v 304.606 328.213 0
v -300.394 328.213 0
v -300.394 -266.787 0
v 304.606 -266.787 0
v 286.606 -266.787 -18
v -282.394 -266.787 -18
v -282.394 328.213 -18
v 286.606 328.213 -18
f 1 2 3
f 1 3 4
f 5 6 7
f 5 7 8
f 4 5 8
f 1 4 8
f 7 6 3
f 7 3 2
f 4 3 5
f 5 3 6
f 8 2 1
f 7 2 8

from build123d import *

# Parameters (mm, degrees)
F0_W     = 605
F0_H     = 595
F1_DEPTH = 18
F2_SIZE  = 17.99999


# Not quite as in the source:
# - a fillet or chamfer is up to 0.001 mm smaller than in the source, because OpenCascade refuses the exact size


with BuildPart() as f1:
    # F0 (on Top) → F1 (new body)
    with BuildSketch(Plane.XY):
        with Locations((2.1061599255, 30.7130831559)):
            Rectangle(F0_W, F0_H)
    extrude(amount=-F1_DEPTH)

    # F2 (size 18 in the source; OpenCascade refuses exactly that, so slightly less here)
    f2_edges = [f1.edges().sort_by_distance(p)[0] for p in [
        (-300.39384, 30.713083, -18),
        (304.60616, 30.713083, -18),
    ]]
    chamfer(f2_edges, length=F2_SIZE)


solid = f1.part
